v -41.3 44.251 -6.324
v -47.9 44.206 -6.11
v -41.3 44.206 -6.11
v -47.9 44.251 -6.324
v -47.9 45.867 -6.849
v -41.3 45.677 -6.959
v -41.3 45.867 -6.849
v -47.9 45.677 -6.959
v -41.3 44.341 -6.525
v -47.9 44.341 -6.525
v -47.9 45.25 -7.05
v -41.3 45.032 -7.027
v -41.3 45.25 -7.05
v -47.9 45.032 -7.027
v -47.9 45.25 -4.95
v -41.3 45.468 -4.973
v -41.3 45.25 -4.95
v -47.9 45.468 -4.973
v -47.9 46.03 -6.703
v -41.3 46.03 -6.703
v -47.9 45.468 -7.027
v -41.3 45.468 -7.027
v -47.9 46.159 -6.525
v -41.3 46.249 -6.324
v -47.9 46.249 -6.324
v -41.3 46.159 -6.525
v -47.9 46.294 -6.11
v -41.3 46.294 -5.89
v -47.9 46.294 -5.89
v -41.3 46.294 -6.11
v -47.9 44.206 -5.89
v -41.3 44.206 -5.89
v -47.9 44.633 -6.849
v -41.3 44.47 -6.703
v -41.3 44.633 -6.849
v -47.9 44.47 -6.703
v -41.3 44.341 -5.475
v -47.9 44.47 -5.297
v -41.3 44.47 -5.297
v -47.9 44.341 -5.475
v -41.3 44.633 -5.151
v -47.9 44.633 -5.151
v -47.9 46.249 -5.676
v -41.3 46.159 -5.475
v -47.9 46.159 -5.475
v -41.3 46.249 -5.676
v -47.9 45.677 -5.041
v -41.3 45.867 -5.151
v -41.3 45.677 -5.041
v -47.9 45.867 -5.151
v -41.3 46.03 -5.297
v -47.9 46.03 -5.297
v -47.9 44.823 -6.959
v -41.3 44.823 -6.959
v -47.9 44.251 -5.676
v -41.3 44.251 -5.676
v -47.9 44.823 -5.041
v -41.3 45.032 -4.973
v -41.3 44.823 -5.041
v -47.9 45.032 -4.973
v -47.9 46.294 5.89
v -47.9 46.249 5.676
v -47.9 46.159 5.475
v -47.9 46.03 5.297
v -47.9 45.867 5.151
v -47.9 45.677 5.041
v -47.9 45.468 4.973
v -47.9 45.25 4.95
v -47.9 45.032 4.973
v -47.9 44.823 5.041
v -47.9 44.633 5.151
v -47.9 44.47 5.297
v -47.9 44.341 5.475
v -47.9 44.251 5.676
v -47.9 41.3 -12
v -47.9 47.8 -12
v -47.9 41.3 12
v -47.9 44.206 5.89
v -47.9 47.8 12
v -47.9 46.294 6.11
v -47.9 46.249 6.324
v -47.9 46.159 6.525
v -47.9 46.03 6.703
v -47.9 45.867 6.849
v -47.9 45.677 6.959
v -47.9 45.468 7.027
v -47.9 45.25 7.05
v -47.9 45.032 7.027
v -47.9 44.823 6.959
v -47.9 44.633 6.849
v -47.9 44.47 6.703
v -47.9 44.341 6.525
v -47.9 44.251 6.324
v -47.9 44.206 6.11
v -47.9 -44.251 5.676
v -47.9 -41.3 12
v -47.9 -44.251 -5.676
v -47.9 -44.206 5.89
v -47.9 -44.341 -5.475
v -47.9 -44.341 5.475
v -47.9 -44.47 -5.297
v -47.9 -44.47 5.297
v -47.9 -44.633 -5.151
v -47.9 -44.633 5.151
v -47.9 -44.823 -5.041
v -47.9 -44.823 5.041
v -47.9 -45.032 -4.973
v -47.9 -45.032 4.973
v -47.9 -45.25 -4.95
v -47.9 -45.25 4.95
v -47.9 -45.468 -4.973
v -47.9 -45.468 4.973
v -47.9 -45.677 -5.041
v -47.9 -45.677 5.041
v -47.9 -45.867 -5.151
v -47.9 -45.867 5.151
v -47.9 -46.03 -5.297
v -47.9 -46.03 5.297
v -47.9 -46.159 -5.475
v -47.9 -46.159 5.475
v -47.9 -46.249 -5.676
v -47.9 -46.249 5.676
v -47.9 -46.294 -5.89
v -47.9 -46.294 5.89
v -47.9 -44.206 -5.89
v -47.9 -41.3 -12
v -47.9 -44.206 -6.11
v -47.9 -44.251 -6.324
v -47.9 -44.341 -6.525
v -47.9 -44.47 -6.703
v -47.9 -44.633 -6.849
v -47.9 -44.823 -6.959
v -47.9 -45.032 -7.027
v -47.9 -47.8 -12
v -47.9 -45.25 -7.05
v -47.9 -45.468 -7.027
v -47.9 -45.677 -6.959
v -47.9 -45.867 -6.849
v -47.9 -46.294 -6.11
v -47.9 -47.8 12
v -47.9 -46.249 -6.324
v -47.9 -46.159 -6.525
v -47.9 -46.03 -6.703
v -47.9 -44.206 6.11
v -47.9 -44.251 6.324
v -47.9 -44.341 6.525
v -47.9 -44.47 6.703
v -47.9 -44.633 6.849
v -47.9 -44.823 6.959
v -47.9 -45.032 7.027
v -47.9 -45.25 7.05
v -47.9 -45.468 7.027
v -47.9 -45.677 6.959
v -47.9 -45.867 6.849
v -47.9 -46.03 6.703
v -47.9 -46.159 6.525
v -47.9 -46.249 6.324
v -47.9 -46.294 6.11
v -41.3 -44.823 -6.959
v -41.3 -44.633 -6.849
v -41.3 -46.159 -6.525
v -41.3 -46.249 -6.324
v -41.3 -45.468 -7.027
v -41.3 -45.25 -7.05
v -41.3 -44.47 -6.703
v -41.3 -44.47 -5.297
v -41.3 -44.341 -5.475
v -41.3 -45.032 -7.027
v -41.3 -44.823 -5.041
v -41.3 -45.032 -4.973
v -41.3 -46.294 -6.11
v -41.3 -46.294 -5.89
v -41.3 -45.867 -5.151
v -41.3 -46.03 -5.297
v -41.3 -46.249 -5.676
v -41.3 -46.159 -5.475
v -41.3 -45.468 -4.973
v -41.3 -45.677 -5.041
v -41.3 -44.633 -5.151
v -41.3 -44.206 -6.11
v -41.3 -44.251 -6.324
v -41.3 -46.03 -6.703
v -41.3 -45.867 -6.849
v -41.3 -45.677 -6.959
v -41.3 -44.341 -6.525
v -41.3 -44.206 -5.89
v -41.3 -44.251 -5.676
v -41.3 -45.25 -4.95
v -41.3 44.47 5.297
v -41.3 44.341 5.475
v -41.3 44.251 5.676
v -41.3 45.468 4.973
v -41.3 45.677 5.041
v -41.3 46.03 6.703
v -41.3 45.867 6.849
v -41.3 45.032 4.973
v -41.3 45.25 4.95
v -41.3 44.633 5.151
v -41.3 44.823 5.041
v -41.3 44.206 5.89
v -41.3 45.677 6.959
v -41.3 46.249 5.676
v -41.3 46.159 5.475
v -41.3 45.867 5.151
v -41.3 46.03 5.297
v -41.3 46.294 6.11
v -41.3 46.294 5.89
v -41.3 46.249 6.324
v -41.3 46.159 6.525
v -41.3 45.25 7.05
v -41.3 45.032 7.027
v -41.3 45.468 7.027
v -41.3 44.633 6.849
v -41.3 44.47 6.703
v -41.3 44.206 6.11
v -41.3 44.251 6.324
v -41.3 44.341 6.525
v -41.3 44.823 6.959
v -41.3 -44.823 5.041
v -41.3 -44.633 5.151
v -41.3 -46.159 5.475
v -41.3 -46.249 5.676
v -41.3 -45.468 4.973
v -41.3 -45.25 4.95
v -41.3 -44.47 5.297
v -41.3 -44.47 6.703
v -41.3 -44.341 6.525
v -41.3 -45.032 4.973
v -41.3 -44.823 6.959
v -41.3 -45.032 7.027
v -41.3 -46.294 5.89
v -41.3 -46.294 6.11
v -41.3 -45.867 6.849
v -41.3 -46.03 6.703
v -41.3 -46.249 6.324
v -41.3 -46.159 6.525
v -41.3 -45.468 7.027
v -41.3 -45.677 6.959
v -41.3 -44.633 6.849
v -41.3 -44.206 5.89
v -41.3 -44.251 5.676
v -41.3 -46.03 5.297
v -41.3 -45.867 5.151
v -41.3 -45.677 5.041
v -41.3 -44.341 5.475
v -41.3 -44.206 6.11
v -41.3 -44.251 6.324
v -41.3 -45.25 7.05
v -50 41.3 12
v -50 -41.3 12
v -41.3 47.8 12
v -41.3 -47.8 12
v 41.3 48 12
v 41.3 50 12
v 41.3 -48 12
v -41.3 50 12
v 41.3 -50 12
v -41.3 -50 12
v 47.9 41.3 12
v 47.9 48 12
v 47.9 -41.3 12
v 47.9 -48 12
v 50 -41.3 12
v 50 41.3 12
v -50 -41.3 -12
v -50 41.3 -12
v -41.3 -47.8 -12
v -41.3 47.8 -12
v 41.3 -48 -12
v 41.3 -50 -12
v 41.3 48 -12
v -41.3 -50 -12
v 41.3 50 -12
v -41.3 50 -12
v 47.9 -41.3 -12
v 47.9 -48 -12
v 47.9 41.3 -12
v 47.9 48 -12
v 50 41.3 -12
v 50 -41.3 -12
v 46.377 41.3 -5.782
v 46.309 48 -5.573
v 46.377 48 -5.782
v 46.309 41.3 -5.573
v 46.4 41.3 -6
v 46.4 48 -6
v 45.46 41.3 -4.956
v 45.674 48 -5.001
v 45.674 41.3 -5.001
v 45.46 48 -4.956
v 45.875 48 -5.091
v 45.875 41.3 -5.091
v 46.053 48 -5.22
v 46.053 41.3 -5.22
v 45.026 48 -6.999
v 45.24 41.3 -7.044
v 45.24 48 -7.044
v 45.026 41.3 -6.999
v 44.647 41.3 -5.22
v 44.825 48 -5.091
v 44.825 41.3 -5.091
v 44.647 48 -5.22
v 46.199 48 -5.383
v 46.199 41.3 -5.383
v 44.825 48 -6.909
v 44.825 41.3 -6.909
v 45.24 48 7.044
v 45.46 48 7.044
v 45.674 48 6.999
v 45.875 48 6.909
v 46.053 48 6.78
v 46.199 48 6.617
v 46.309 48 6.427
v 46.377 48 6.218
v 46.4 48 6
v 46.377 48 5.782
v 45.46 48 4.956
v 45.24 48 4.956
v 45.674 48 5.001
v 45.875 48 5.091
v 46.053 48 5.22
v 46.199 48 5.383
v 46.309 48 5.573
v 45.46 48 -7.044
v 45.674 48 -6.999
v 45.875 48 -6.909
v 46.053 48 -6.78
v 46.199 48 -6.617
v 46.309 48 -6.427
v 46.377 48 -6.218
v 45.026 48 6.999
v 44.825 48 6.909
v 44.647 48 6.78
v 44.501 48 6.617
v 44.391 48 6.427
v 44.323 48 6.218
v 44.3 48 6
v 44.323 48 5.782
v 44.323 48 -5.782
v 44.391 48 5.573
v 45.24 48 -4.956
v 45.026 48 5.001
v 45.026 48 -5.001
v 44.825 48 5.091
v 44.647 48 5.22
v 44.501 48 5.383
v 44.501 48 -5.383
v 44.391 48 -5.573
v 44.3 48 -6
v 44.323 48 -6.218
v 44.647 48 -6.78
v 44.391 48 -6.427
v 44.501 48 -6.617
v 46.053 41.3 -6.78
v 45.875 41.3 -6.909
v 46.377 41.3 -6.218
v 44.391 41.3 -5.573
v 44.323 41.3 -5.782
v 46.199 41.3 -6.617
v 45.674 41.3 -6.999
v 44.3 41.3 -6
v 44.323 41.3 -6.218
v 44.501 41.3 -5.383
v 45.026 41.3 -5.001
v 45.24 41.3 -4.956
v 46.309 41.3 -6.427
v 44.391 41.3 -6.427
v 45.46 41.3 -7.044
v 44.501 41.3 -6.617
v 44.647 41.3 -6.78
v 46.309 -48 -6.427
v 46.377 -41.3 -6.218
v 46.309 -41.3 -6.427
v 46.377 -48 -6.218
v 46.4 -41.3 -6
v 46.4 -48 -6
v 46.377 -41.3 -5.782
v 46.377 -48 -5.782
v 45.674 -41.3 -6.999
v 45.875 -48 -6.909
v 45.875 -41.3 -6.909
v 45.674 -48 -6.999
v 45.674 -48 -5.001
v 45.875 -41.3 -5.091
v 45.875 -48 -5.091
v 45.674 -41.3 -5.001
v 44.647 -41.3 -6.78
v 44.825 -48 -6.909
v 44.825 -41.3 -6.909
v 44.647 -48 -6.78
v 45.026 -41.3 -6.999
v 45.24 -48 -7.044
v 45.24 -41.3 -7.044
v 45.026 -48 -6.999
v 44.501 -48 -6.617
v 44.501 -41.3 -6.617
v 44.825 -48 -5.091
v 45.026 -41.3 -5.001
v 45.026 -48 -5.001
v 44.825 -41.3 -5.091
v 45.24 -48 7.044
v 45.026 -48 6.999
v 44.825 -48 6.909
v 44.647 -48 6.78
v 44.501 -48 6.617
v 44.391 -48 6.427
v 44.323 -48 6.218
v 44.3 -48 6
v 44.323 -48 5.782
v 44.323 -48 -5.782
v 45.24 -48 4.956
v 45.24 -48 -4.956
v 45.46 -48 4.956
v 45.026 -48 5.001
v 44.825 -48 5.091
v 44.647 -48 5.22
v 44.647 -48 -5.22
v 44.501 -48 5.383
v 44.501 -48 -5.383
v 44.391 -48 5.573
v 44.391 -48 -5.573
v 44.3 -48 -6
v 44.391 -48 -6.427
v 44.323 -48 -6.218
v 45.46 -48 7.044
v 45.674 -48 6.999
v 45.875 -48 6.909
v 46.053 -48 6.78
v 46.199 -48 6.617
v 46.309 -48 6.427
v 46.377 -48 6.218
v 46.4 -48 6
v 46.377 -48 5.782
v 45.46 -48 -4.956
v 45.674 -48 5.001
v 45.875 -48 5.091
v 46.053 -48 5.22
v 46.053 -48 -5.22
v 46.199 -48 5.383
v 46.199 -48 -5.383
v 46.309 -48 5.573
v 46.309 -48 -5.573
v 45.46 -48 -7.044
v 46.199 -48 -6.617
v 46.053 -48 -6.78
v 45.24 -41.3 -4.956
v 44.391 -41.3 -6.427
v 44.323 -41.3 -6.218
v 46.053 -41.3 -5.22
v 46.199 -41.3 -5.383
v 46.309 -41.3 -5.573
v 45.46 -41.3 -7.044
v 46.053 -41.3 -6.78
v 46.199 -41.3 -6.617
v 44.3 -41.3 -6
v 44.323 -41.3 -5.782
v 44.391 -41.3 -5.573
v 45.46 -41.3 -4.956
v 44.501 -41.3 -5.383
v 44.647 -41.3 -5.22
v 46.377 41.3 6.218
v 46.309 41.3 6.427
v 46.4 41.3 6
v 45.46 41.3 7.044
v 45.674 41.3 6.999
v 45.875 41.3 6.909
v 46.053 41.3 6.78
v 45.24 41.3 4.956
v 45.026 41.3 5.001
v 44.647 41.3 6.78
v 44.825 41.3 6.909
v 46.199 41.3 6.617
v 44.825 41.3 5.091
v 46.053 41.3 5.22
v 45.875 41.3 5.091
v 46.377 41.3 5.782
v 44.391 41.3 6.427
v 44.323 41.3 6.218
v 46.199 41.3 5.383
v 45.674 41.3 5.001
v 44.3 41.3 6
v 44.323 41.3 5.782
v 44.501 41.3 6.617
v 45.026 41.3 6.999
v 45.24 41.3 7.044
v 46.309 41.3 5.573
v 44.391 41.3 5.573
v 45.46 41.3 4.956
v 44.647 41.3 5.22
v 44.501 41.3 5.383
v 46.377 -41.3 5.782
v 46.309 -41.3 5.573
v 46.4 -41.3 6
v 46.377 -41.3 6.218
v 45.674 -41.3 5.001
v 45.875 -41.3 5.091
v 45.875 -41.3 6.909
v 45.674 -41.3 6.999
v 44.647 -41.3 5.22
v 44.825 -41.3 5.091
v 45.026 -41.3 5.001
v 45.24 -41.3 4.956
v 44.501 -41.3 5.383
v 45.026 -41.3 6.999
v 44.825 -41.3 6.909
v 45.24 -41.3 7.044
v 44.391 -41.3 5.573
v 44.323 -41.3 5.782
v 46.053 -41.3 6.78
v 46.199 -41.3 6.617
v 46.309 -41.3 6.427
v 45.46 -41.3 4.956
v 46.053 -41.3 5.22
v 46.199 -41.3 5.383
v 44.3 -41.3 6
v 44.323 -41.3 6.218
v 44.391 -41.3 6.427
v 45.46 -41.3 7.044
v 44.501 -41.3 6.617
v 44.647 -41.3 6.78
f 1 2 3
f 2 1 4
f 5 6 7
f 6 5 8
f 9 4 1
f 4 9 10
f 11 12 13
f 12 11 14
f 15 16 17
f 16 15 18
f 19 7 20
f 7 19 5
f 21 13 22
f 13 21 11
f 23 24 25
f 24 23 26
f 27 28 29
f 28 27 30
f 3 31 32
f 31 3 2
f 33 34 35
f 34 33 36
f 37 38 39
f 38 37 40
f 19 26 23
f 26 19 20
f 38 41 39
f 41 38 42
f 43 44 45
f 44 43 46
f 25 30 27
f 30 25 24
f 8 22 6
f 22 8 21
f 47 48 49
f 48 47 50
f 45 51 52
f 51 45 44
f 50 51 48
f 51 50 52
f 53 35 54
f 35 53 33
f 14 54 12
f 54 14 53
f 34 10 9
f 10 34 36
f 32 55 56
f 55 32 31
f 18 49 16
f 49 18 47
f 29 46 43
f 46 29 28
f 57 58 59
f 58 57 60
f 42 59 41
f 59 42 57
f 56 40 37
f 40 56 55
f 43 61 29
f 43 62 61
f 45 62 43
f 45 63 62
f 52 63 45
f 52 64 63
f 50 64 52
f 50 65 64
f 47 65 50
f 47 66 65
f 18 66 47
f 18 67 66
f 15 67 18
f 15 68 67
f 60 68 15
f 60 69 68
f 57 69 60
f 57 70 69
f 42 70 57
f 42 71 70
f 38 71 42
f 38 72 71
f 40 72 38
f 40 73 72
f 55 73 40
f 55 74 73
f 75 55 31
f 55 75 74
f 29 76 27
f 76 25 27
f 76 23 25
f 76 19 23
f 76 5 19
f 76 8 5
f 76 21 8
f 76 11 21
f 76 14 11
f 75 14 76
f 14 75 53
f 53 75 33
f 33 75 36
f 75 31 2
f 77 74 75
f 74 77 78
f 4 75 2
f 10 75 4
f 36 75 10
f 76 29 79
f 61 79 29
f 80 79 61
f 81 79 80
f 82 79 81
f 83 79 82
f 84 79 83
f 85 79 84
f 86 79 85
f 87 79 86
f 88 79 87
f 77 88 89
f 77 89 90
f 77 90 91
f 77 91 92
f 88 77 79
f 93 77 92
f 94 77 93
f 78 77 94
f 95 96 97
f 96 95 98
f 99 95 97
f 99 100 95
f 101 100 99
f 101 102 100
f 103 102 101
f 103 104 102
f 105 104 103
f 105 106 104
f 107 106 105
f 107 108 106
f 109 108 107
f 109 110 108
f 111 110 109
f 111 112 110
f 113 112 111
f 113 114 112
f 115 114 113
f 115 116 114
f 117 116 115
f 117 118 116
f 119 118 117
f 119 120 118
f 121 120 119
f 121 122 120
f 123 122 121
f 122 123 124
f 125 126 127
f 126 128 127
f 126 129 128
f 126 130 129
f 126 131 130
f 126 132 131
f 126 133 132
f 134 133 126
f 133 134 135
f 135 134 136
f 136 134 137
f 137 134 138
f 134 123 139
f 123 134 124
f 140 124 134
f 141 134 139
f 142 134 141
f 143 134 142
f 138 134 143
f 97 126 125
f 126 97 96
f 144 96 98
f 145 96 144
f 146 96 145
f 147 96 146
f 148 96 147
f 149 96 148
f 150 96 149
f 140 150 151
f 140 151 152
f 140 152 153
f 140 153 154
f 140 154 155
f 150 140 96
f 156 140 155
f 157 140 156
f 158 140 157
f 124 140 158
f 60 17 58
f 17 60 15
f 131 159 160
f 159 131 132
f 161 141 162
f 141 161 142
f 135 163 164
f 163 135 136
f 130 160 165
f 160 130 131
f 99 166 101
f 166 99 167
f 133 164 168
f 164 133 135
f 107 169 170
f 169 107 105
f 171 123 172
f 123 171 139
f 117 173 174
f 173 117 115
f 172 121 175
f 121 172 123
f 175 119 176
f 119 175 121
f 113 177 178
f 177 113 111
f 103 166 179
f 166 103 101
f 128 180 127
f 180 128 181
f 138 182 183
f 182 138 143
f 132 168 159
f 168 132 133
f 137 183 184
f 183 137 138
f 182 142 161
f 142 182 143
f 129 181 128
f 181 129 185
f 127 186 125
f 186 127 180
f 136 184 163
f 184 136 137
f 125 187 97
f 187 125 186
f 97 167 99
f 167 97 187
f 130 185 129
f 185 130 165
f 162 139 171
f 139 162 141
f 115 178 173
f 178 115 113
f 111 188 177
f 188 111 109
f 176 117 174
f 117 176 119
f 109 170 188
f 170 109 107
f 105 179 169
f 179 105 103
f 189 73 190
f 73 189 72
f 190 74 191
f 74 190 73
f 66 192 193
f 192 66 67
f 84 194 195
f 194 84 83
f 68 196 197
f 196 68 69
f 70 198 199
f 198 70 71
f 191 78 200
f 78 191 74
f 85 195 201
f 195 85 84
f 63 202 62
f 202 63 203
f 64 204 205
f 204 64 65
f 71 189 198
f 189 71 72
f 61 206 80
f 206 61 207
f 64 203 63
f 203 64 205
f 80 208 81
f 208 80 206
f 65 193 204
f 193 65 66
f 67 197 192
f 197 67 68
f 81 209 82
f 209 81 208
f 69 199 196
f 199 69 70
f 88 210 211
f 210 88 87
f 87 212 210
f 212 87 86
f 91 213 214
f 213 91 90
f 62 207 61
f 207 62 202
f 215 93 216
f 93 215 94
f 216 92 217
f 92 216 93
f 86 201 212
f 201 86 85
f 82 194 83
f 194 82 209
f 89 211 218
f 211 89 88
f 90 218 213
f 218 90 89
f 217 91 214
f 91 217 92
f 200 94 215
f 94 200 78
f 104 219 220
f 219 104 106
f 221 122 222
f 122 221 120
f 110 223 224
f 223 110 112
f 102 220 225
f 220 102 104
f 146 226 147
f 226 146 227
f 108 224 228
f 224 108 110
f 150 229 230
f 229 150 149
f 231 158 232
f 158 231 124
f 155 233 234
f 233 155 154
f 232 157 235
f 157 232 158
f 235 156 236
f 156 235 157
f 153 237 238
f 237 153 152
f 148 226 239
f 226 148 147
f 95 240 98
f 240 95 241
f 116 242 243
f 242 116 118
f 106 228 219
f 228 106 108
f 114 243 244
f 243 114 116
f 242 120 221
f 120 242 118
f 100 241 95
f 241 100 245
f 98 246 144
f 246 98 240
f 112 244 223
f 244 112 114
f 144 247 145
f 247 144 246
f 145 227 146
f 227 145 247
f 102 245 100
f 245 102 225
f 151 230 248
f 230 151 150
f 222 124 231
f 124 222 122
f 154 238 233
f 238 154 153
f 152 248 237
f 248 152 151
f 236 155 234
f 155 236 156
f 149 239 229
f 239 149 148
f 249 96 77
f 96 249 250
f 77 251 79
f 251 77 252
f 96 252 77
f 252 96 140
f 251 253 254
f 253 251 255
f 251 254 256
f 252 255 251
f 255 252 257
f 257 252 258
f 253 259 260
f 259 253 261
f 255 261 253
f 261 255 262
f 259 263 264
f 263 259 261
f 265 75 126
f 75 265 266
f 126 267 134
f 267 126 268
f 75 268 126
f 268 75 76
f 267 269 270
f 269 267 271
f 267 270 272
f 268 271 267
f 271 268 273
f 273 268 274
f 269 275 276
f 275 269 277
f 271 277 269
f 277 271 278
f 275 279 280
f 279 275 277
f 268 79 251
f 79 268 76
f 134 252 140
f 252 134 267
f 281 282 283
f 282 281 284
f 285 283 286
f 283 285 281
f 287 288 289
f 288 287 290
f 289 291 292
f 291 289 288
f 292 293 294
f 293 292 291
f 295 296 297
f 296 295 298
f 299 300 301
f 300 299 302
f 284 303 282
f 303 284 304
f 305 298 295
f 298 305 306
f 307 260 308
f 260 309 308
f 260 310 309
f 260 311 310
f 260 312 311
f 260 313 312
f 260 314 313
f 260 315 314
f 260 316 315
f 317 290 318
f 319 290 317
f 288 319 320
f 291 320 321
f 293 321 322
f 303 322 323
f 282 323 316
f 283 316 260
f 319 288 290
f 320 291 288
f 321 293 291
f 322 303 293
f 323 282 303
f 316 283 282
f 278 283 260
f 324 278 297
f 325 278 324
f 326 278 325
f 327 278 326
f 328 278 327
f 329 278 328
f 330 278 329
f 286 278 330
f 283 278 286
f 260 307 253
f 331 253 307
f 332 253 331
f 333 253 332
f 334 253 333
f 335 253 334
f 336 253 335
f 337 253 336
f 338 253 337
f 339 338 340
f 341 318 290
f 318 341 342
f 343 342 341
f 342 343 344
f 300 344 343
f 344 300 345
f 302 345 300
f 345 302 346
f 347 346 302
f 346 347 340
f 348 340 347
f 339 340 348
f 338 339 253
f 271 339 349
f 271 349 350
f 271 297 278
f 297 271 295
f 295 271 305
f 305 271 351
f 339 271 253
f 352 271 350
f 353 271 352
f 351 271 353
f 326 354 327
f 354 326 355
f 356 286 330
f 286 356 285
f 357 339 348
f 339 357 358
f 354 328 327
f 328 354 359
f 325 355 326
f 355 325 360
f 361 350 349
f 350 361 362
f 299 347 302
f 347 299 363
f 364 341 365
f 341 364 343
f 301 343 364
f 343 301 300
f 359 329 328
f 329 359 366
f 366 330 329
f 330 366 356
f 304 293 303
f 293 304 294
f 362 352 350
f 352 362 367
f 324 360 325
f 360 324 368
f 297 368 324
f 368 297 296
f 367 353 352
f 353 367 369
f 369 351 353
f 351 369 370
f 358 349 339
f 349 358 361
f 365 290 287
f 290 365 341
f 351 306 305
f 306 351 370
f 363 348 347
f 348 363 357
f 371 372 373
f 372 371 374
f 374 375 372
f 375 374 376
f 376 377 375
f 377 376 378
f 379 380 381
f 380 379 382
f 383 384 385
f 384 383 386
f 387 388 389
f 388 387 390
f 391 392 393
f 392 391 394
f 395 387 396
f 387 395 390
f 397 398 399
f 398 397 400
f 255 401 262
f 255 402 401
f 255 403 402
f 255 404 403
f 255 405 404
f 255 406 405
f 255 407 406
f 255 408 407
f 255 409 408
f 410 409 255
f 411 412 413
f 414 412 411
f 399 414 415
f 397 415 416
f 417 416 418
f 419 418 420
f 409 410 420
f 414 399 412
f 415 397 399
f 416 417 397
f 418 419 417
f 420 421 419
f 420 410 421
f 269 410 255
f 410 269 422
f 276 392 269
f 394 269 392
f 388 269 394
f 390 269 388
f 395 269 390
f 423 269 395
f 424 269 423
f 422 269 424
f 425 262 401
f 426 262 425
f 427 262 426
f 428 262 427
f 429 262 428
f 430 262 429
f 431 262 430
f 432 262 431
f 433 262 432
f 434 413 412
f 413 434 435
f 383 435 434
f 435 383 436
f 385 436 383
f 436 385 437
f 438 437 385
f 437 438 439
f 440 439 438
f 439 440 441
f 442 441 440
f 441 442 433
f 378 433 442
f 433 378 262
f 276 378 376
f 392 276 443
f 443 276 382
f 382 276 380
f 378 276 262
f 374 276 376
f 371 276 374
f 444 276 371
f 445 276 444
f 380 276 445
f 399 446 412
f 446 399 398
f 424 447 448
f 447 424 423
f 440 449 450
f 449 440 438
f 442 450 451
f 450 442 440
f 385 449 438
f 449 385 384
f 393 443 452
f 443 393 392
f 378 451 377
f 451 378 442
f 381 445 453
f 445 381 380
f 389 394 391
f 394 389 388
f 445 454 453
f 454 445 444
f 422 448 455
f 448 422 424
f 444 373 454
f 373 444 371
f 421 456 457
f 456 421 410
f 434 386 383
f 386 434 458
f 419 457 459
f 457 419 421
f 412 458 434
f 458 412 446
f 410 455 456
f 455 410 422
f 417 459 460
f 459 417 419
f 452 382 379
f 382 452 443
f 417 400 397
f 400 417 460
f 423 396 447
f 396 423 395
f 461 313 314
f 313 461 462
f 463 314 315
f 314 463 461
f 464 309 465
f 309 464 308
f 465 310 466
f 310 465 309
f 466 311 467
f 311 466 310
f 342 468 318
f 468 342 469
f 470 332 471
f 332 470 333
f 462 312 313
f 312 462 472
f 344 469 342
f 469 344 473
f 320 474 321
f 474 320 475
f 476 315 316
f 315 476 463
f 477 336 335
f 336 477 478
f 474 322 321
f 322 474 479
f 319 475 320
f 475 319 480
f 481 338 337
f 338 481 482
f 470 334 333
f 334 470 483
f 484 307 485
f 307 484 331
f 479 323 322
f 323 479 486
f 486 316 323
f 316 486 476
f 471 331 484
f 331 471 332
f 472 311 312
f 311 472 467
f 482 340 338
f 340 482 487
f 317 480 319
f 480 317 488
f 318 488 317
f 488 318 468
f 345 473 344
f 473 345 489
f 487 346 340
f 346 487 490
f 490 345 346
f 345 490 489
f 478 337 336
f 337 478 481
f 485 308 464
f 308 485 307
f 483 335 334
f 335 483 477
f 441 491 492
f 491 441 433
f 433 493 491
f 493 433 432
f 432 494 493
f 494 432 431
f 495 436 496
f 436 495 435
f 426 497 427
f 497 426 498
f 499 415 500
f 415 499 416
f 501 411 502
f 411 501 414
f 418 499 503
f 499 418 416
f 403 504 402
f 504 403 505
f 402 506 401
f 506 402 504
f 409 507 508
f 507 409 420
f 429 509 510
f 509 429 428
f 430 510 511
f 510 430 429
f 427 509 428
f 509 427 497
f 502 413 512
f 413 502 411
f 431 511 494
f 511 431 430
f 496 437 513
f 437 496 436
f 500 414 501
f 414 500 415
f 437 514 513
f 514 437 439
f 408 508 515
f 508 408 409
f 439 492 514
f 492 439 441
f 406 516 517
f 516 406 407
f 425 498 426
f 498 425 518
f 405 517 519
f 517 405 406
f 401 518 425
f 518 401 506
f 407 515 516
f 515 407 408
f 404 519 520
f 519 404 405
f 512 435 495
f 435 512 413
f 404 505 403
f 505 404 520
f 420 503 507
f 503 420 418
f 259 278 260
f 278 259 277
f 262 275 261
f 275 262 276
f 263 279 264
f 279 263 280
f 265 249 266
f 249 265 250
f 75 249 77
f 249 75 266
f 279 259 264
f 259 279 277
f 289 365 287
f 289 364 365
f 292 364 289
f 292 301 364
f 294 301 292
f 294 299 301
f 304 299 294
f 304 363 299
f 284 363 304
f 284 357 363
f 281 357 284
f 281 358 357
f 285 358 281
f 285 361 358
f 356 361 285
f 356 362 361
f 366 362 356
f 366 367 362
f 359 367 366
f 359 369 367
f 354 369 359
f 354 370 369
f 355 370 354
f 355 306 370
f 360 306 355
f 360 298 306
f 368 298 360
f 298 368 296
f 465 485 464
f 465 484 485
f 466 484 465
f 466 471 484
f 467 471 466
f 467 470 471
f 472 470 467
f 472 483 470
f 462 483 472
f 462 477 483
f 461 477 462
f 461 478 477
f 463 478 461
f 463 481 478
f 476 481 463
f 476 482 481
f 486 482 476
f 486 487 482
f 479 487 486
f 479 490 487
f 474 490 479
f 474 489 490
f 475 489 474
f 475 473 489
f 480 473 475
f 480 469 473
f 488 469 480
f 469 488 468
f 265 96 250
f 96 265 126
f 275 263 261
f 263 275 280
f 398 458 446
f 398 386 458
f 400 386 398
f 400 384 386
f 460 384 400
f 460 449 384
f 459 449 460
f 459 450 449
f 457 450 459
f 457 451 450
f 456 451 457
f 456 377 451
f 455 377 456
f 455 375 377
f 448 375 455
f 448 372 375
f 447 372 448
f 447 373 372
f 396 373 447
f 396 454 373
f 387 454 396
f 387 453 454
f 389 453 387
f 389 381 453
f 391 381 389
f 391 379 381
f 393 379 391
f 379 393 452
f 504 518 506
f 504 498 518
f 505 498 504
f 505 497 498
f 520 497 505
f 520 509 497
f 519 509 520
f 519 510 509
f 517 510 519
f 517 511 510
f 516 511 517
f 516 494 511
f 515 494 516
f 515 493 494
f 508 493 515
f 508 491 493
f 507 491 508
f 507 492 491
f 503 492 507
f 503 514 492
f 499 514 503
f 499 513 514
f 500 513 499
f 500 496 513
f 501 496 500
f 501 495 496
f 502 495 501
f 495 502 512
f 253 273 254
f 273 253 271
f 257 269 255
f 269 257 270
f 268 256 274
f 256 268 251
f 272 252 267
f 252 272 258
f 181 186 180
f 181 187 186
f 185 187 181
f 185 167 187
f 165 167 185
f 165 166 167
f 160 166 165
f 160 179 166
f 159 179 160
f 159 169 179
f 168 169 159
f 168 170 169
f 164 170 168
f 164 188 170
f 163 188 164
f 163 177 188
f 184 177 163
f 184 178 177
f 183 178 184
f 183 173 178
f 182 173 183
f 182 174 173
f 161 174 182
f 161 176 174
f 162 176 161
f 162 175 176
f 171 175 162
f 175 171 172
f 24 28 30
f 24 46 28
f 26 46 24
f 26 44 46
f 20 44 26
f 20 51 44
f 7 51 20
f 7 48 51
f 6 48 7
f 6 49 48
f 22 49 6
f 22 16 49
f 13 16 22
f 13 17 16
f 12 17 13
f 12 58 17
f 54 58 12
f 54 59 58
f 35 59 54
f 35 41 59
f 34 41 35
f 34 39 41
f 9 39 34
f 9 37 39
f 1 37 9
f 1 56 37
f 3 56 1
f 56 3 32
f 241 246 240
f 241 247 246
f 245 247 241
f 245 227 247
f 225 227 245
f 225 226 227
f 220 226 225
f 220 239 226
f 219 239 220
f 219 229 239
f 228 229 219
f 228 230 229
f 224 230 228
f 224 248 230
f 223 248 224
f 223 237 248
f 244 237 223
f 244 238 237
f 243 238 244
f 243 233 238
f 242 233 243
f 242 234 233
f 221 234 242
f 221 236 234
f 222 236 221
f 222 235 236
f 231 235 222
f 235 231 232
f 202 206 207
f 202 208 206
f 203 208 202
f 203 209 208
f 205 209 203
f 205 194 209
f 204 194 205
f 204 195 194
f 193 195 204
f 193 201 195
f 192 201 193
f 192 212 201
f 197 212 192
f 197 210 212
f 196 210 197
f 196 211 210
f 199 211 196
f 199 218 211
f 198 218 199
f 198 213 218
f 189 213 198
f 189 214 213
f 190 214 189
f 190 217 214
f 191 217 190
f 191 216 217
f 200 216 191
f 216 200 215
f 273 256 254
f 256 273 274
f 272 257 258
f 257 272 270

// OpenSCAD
/*
Design by Joe Iddon.
*/

$fn = 30;

module beekit_interface(layers){
    //using dimensions in https://open-cosmos.com/beekit-usermanual
    //there is a dimension missing from that schematic though:
    //the width of every side with cutouts is 82.6 - this was confirmed
    //from an autodesk 360 model
    //x-axis points in same direciton as two of the fasteners
    //layers determines the height of this mechanical interface
    //module - e.g. a value of `2` means a height of (2*12+12)mm
    //so would have a potential of 16 holes to be screwed in to the
    //beekit frame
    width = 100; //square, so length = width
    cutout_width = 82.6; //width of all the "flat" sides (after cutouts)
    //meaning of all indent measurements seen from schematic
    x_indent = 95.8;
    y_indent_close = 95.6;
    y_indent_far = 96;
    hole_sep = 12; //vertical separation between screw holes
    buffer_height = 6; // (12 / 2) - so doesn't end on a screw hole
    hole_diameter = 2.1; //needs experimentation if 3d printing
    hole_dist = 2.55; //distance of screw holes from nearest edges
    hole_depth = 7; //random choice, schematic defined must be > 5
    
    height = (layers-1)*hole_sep+buffer_height*2;
    union(){
        cube([width,cutout_width,height], center=true);
        cube([cutout_width,width,height], center=true);
        translate([-x_indent/4,0,0])
        difference(){ //hole block facing the same way ("close")
            cube([x_indent/2,y_indent_close,height], center=true);
            for (hole = [0:layers-1])
            translate ([0,0,-height/2+buffer_height+hole*hole_sep]){
                translate([-x_indent/4,y_indent_close/2-hole_dist,0])
                rotate([0,90,0]) cylinder(d=hole_diameter,h=hole_depth);
                translate([-x_indent/4,-(y_indent_close/2-hole_dist),0])
                rotate([0,90,0]) cylinder(d=hole_diameter,h=hole_depth);
            }
        }
        translate([x_indent/4,0,0])
        difference(){ //hole block facing outwars ("far")
            cube([x_indent/2,y_indent_far,height], center=true);
            for (hole = [0:layers-1])
            translate([0,0,-height/2+buffer_height+hole*hole_sep]){
                translate([x_indent/4-hole_dist,y_indent_far/2,0])
                rotate([90,0,0]) cylinder(d=hole_diameter,h=hole_depth);
                translate([x_indent/4-hole_dist,-y_indent_far/2,0])
                rotate([-90,0,0]) cylinder(d=hole_diameter,h=hole_depth);
            }
        }
    }
}

beekit_interface(2);
